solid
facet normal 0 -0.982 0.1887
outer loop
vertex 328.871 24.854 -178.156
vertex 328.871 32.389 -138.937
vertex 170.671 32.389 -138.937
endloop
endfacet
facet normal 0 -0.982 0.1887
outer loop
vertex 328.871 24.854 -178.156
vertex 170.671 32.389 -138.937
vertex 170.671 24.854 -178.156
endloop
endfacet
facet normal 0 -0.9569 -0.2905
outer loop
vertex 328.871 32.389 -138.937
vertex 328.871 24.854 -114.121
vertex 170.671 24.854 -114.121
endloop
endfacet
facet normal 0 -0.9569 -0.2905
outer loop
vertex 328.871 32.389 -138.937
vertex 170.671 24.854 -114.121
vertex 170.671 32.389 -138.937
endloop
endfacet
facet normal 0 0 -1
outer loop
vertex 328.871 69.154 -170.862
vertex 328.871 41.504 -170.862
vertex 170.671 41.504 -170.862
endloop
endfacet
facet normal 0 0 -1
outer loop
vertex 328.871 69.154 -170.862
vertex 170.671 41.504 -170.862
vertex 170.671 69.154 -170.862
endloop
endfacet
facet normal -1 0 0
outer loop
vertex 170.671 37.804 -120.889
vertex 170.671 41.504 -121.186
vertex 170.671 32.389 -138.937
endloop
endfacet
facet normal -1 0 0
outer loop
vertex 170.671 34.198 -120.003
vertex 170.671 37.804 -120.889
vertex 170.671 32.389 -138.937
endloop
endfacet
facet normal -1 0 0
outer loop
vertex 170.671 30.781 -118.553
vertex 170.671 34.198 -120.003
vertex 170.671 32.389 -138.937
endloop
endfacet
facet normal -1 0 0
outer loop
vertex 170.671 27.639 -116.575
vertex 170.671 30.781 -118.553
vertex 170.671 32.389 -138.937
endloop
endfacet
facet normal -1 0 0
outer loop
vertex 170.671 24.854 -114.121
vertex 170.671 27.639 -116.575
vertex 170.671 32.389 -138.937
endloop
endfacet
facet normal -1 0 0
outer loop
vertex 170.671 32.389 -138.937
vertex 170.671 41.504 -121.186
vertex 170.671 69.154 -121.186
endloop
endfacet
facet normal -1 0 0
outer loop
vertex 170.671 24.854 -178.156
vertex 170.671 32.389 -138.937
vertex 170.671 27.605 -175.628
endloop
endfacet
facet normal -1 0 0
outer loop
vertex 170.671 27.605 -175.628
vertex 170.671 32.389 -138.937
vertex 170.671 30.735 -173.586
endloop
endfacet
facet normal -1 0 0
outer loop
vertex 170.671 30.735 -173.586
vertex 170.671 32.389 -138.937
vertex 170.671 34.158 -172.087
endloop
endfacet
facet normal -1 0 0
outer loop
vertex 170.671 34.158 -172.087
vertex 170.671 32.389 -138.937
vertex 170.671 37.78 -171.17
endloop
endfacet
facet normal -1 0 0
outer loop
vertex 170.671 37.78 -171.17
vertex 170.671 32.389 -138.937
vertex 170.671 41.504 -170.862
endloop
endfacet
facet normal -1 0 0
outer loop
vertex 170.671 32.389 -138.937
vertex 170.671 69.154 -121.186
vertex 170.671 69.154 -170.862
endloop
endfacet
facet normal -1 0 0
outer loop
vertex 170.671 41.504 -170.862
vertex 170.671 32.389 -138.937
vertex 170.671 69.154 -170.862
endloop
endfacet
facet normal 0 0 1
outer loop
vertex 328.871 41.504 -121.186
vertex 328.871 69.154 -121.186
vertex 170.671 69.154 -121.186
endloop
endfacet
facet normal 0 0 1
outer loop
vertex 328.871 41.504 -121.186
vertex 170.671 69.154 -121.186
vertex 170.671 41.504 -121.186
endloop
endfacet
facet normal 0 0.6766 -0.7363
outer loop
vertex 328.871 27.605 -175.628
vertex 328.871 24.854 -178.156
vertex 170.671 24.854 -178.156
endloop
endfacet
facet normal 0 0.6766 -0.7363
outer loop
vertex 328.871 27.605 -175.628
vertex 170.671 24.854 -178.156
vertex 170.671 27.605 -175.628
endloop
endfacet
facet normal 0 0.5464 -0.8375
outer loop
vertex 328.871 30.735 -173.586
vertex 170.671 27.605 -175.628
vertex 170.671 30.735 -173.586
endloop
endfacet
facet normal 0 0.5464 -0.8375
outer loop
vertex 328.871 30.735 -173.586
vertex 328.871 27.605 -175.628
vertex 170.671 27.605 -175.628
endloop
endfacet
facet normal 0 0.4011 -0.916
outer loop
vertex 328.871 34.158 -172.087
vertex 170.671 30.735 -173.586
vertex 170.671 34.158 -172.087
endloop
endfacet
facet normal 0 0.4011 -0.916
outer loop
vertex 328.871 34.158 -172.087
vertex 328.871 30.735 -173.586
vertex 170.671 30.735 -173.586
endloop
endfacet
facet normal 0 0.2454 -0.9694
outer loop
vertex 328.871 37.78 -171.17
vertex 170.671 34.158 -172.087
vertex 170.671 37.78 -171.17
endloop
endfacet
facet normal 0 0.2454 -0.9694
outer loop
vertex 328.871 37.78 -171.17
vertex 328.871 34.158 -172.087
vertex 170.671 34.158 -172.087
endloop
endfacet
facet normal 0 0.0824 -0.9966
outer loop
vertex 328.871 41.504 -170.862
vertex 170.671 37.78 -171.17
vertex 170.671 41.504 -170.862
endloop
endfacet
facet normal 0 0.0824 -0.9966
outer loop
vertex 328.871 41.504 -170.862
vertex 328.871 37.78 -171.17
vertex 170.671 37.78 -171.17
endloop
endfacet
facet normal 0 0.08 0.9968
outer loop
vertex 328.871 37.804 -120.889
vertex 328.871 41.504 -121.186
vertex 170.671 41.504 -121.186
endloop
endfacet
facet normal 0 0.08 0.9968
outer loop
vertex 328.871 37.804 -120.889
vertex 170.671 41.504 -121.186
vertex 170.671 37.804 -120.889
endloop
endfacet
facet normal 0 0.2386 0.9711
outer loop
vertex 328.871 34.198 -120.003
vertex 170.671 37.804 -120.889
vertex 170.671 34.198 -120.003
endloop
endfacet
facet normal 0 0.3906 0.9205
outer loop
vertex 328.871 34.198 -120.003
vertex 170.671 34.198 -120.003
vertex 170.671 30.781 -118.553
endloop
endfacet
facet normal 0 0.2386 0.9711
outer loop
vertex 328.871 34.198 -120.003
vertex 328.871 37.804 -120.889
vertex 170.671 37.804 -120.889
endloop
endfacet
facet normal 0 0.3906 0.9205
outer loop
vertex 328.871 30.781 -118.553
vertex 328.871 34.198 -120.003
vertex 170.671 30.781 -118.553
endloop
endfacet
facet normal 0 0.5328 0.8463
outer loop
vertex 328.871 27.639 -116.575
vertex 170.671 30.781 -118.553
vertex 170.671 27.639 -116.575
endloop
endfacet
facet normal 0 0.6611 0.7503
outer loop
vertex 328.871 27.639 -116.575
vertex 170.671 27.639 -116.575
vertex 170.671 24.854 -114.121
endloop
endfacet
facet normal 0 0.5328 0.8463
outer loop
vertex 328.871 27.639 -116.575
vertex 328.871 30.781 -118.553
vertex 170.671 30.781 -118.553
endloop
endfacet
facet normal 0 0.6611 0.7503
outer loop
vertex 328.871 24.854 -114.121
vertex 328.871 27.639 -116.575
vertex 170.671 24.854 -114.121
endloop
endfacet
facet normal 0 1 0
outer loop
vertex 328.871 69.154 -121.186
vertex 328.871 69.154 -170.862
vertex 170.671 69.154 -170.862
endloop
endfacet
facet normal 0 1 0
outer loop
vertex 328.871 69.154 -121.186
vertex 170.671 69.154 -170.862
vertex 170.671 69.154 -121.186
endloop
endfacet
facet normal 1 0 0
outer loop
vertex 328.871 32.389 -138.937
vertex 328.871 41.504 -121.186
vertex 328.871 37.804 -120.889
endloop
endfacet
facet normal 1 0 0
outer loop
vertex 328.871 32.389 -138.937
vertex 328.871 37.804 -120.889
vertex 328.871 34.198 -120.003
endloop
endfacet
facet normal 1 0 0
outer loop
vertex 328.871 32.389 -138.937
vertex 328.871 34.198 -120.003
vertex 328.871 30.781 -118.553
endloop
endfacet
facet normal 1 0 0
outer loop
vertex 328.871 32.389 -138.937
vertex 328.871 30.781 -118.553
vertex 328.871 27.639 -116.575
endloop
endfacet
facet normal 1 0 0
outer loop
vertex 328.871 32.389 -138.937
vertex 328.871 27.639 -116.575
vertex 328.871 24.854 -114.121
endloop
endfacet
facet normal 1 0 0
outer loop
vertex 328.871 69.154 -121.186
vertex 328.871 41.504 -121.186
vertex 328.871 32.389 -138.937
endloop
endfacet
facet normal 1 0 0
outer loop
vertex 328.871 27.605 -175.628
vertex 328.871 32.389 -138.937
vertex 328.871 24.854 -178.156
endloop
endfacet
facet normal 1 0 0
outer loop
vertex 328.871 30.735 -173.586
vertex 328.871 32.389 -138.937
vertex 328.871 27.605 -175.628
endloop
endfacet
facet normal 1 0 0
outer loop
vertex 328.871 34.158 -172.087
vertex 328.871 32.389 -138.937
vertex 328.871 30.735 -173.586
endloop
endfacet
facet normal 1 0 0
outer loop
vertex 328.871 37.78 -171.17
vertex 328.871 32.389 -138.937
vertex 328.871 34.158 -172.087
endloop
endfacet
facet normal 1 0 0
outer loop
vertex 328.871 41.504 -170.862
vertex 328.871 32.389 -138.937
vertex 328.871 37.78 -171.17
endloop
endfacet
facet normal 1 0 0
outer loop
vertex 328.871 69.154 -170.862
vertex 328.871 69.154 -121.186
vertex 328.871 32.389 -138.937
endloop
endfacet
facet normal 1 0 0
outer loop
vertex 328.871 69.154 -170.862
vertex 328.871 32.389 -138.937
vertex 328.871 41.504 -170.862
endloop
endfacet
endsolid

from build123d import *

# Parameters (mm, degrees)
BOSS_EXTRUDE1_DEPTH = 158.2


with BuildPart() as part:
    # Sketch3 → Boss-Extrude1 (new body)
    with BuildSketch(Plane(origin=(328.871419331, 0, 0), x_dir=(0, 0, -1), z_dir=(1, 0, 0))):
        with BuildLine():
            Line((121.186445143, 69.154189934), (121.186445143, 41.504189934))
            ThreePointArc((121.186445143, 41.504189934), (119.346896311, 32.460563946), (114.120598835, 24.854189934))
            Line((114.120598835, 24.854189934), (138.936767093, 32.389389728))
            Line((138.936767093, 32.389389728), (178.156292487, 24.854189934))
            ThreePointArc((178.156292487, 24.854189934), (172.765616446, 32.415348759), (170.862073158, 41.504189934))
            Line((170.862073158, 41.504189934), (170.862073158, 69.154189934))
            Line((170.862073158, 69.154189934), (121.186445143, 69.154189934))
        make_face()
    extrude(amount=-BOSS_EXTRUDE1_DEPTH)


solid = part.part
